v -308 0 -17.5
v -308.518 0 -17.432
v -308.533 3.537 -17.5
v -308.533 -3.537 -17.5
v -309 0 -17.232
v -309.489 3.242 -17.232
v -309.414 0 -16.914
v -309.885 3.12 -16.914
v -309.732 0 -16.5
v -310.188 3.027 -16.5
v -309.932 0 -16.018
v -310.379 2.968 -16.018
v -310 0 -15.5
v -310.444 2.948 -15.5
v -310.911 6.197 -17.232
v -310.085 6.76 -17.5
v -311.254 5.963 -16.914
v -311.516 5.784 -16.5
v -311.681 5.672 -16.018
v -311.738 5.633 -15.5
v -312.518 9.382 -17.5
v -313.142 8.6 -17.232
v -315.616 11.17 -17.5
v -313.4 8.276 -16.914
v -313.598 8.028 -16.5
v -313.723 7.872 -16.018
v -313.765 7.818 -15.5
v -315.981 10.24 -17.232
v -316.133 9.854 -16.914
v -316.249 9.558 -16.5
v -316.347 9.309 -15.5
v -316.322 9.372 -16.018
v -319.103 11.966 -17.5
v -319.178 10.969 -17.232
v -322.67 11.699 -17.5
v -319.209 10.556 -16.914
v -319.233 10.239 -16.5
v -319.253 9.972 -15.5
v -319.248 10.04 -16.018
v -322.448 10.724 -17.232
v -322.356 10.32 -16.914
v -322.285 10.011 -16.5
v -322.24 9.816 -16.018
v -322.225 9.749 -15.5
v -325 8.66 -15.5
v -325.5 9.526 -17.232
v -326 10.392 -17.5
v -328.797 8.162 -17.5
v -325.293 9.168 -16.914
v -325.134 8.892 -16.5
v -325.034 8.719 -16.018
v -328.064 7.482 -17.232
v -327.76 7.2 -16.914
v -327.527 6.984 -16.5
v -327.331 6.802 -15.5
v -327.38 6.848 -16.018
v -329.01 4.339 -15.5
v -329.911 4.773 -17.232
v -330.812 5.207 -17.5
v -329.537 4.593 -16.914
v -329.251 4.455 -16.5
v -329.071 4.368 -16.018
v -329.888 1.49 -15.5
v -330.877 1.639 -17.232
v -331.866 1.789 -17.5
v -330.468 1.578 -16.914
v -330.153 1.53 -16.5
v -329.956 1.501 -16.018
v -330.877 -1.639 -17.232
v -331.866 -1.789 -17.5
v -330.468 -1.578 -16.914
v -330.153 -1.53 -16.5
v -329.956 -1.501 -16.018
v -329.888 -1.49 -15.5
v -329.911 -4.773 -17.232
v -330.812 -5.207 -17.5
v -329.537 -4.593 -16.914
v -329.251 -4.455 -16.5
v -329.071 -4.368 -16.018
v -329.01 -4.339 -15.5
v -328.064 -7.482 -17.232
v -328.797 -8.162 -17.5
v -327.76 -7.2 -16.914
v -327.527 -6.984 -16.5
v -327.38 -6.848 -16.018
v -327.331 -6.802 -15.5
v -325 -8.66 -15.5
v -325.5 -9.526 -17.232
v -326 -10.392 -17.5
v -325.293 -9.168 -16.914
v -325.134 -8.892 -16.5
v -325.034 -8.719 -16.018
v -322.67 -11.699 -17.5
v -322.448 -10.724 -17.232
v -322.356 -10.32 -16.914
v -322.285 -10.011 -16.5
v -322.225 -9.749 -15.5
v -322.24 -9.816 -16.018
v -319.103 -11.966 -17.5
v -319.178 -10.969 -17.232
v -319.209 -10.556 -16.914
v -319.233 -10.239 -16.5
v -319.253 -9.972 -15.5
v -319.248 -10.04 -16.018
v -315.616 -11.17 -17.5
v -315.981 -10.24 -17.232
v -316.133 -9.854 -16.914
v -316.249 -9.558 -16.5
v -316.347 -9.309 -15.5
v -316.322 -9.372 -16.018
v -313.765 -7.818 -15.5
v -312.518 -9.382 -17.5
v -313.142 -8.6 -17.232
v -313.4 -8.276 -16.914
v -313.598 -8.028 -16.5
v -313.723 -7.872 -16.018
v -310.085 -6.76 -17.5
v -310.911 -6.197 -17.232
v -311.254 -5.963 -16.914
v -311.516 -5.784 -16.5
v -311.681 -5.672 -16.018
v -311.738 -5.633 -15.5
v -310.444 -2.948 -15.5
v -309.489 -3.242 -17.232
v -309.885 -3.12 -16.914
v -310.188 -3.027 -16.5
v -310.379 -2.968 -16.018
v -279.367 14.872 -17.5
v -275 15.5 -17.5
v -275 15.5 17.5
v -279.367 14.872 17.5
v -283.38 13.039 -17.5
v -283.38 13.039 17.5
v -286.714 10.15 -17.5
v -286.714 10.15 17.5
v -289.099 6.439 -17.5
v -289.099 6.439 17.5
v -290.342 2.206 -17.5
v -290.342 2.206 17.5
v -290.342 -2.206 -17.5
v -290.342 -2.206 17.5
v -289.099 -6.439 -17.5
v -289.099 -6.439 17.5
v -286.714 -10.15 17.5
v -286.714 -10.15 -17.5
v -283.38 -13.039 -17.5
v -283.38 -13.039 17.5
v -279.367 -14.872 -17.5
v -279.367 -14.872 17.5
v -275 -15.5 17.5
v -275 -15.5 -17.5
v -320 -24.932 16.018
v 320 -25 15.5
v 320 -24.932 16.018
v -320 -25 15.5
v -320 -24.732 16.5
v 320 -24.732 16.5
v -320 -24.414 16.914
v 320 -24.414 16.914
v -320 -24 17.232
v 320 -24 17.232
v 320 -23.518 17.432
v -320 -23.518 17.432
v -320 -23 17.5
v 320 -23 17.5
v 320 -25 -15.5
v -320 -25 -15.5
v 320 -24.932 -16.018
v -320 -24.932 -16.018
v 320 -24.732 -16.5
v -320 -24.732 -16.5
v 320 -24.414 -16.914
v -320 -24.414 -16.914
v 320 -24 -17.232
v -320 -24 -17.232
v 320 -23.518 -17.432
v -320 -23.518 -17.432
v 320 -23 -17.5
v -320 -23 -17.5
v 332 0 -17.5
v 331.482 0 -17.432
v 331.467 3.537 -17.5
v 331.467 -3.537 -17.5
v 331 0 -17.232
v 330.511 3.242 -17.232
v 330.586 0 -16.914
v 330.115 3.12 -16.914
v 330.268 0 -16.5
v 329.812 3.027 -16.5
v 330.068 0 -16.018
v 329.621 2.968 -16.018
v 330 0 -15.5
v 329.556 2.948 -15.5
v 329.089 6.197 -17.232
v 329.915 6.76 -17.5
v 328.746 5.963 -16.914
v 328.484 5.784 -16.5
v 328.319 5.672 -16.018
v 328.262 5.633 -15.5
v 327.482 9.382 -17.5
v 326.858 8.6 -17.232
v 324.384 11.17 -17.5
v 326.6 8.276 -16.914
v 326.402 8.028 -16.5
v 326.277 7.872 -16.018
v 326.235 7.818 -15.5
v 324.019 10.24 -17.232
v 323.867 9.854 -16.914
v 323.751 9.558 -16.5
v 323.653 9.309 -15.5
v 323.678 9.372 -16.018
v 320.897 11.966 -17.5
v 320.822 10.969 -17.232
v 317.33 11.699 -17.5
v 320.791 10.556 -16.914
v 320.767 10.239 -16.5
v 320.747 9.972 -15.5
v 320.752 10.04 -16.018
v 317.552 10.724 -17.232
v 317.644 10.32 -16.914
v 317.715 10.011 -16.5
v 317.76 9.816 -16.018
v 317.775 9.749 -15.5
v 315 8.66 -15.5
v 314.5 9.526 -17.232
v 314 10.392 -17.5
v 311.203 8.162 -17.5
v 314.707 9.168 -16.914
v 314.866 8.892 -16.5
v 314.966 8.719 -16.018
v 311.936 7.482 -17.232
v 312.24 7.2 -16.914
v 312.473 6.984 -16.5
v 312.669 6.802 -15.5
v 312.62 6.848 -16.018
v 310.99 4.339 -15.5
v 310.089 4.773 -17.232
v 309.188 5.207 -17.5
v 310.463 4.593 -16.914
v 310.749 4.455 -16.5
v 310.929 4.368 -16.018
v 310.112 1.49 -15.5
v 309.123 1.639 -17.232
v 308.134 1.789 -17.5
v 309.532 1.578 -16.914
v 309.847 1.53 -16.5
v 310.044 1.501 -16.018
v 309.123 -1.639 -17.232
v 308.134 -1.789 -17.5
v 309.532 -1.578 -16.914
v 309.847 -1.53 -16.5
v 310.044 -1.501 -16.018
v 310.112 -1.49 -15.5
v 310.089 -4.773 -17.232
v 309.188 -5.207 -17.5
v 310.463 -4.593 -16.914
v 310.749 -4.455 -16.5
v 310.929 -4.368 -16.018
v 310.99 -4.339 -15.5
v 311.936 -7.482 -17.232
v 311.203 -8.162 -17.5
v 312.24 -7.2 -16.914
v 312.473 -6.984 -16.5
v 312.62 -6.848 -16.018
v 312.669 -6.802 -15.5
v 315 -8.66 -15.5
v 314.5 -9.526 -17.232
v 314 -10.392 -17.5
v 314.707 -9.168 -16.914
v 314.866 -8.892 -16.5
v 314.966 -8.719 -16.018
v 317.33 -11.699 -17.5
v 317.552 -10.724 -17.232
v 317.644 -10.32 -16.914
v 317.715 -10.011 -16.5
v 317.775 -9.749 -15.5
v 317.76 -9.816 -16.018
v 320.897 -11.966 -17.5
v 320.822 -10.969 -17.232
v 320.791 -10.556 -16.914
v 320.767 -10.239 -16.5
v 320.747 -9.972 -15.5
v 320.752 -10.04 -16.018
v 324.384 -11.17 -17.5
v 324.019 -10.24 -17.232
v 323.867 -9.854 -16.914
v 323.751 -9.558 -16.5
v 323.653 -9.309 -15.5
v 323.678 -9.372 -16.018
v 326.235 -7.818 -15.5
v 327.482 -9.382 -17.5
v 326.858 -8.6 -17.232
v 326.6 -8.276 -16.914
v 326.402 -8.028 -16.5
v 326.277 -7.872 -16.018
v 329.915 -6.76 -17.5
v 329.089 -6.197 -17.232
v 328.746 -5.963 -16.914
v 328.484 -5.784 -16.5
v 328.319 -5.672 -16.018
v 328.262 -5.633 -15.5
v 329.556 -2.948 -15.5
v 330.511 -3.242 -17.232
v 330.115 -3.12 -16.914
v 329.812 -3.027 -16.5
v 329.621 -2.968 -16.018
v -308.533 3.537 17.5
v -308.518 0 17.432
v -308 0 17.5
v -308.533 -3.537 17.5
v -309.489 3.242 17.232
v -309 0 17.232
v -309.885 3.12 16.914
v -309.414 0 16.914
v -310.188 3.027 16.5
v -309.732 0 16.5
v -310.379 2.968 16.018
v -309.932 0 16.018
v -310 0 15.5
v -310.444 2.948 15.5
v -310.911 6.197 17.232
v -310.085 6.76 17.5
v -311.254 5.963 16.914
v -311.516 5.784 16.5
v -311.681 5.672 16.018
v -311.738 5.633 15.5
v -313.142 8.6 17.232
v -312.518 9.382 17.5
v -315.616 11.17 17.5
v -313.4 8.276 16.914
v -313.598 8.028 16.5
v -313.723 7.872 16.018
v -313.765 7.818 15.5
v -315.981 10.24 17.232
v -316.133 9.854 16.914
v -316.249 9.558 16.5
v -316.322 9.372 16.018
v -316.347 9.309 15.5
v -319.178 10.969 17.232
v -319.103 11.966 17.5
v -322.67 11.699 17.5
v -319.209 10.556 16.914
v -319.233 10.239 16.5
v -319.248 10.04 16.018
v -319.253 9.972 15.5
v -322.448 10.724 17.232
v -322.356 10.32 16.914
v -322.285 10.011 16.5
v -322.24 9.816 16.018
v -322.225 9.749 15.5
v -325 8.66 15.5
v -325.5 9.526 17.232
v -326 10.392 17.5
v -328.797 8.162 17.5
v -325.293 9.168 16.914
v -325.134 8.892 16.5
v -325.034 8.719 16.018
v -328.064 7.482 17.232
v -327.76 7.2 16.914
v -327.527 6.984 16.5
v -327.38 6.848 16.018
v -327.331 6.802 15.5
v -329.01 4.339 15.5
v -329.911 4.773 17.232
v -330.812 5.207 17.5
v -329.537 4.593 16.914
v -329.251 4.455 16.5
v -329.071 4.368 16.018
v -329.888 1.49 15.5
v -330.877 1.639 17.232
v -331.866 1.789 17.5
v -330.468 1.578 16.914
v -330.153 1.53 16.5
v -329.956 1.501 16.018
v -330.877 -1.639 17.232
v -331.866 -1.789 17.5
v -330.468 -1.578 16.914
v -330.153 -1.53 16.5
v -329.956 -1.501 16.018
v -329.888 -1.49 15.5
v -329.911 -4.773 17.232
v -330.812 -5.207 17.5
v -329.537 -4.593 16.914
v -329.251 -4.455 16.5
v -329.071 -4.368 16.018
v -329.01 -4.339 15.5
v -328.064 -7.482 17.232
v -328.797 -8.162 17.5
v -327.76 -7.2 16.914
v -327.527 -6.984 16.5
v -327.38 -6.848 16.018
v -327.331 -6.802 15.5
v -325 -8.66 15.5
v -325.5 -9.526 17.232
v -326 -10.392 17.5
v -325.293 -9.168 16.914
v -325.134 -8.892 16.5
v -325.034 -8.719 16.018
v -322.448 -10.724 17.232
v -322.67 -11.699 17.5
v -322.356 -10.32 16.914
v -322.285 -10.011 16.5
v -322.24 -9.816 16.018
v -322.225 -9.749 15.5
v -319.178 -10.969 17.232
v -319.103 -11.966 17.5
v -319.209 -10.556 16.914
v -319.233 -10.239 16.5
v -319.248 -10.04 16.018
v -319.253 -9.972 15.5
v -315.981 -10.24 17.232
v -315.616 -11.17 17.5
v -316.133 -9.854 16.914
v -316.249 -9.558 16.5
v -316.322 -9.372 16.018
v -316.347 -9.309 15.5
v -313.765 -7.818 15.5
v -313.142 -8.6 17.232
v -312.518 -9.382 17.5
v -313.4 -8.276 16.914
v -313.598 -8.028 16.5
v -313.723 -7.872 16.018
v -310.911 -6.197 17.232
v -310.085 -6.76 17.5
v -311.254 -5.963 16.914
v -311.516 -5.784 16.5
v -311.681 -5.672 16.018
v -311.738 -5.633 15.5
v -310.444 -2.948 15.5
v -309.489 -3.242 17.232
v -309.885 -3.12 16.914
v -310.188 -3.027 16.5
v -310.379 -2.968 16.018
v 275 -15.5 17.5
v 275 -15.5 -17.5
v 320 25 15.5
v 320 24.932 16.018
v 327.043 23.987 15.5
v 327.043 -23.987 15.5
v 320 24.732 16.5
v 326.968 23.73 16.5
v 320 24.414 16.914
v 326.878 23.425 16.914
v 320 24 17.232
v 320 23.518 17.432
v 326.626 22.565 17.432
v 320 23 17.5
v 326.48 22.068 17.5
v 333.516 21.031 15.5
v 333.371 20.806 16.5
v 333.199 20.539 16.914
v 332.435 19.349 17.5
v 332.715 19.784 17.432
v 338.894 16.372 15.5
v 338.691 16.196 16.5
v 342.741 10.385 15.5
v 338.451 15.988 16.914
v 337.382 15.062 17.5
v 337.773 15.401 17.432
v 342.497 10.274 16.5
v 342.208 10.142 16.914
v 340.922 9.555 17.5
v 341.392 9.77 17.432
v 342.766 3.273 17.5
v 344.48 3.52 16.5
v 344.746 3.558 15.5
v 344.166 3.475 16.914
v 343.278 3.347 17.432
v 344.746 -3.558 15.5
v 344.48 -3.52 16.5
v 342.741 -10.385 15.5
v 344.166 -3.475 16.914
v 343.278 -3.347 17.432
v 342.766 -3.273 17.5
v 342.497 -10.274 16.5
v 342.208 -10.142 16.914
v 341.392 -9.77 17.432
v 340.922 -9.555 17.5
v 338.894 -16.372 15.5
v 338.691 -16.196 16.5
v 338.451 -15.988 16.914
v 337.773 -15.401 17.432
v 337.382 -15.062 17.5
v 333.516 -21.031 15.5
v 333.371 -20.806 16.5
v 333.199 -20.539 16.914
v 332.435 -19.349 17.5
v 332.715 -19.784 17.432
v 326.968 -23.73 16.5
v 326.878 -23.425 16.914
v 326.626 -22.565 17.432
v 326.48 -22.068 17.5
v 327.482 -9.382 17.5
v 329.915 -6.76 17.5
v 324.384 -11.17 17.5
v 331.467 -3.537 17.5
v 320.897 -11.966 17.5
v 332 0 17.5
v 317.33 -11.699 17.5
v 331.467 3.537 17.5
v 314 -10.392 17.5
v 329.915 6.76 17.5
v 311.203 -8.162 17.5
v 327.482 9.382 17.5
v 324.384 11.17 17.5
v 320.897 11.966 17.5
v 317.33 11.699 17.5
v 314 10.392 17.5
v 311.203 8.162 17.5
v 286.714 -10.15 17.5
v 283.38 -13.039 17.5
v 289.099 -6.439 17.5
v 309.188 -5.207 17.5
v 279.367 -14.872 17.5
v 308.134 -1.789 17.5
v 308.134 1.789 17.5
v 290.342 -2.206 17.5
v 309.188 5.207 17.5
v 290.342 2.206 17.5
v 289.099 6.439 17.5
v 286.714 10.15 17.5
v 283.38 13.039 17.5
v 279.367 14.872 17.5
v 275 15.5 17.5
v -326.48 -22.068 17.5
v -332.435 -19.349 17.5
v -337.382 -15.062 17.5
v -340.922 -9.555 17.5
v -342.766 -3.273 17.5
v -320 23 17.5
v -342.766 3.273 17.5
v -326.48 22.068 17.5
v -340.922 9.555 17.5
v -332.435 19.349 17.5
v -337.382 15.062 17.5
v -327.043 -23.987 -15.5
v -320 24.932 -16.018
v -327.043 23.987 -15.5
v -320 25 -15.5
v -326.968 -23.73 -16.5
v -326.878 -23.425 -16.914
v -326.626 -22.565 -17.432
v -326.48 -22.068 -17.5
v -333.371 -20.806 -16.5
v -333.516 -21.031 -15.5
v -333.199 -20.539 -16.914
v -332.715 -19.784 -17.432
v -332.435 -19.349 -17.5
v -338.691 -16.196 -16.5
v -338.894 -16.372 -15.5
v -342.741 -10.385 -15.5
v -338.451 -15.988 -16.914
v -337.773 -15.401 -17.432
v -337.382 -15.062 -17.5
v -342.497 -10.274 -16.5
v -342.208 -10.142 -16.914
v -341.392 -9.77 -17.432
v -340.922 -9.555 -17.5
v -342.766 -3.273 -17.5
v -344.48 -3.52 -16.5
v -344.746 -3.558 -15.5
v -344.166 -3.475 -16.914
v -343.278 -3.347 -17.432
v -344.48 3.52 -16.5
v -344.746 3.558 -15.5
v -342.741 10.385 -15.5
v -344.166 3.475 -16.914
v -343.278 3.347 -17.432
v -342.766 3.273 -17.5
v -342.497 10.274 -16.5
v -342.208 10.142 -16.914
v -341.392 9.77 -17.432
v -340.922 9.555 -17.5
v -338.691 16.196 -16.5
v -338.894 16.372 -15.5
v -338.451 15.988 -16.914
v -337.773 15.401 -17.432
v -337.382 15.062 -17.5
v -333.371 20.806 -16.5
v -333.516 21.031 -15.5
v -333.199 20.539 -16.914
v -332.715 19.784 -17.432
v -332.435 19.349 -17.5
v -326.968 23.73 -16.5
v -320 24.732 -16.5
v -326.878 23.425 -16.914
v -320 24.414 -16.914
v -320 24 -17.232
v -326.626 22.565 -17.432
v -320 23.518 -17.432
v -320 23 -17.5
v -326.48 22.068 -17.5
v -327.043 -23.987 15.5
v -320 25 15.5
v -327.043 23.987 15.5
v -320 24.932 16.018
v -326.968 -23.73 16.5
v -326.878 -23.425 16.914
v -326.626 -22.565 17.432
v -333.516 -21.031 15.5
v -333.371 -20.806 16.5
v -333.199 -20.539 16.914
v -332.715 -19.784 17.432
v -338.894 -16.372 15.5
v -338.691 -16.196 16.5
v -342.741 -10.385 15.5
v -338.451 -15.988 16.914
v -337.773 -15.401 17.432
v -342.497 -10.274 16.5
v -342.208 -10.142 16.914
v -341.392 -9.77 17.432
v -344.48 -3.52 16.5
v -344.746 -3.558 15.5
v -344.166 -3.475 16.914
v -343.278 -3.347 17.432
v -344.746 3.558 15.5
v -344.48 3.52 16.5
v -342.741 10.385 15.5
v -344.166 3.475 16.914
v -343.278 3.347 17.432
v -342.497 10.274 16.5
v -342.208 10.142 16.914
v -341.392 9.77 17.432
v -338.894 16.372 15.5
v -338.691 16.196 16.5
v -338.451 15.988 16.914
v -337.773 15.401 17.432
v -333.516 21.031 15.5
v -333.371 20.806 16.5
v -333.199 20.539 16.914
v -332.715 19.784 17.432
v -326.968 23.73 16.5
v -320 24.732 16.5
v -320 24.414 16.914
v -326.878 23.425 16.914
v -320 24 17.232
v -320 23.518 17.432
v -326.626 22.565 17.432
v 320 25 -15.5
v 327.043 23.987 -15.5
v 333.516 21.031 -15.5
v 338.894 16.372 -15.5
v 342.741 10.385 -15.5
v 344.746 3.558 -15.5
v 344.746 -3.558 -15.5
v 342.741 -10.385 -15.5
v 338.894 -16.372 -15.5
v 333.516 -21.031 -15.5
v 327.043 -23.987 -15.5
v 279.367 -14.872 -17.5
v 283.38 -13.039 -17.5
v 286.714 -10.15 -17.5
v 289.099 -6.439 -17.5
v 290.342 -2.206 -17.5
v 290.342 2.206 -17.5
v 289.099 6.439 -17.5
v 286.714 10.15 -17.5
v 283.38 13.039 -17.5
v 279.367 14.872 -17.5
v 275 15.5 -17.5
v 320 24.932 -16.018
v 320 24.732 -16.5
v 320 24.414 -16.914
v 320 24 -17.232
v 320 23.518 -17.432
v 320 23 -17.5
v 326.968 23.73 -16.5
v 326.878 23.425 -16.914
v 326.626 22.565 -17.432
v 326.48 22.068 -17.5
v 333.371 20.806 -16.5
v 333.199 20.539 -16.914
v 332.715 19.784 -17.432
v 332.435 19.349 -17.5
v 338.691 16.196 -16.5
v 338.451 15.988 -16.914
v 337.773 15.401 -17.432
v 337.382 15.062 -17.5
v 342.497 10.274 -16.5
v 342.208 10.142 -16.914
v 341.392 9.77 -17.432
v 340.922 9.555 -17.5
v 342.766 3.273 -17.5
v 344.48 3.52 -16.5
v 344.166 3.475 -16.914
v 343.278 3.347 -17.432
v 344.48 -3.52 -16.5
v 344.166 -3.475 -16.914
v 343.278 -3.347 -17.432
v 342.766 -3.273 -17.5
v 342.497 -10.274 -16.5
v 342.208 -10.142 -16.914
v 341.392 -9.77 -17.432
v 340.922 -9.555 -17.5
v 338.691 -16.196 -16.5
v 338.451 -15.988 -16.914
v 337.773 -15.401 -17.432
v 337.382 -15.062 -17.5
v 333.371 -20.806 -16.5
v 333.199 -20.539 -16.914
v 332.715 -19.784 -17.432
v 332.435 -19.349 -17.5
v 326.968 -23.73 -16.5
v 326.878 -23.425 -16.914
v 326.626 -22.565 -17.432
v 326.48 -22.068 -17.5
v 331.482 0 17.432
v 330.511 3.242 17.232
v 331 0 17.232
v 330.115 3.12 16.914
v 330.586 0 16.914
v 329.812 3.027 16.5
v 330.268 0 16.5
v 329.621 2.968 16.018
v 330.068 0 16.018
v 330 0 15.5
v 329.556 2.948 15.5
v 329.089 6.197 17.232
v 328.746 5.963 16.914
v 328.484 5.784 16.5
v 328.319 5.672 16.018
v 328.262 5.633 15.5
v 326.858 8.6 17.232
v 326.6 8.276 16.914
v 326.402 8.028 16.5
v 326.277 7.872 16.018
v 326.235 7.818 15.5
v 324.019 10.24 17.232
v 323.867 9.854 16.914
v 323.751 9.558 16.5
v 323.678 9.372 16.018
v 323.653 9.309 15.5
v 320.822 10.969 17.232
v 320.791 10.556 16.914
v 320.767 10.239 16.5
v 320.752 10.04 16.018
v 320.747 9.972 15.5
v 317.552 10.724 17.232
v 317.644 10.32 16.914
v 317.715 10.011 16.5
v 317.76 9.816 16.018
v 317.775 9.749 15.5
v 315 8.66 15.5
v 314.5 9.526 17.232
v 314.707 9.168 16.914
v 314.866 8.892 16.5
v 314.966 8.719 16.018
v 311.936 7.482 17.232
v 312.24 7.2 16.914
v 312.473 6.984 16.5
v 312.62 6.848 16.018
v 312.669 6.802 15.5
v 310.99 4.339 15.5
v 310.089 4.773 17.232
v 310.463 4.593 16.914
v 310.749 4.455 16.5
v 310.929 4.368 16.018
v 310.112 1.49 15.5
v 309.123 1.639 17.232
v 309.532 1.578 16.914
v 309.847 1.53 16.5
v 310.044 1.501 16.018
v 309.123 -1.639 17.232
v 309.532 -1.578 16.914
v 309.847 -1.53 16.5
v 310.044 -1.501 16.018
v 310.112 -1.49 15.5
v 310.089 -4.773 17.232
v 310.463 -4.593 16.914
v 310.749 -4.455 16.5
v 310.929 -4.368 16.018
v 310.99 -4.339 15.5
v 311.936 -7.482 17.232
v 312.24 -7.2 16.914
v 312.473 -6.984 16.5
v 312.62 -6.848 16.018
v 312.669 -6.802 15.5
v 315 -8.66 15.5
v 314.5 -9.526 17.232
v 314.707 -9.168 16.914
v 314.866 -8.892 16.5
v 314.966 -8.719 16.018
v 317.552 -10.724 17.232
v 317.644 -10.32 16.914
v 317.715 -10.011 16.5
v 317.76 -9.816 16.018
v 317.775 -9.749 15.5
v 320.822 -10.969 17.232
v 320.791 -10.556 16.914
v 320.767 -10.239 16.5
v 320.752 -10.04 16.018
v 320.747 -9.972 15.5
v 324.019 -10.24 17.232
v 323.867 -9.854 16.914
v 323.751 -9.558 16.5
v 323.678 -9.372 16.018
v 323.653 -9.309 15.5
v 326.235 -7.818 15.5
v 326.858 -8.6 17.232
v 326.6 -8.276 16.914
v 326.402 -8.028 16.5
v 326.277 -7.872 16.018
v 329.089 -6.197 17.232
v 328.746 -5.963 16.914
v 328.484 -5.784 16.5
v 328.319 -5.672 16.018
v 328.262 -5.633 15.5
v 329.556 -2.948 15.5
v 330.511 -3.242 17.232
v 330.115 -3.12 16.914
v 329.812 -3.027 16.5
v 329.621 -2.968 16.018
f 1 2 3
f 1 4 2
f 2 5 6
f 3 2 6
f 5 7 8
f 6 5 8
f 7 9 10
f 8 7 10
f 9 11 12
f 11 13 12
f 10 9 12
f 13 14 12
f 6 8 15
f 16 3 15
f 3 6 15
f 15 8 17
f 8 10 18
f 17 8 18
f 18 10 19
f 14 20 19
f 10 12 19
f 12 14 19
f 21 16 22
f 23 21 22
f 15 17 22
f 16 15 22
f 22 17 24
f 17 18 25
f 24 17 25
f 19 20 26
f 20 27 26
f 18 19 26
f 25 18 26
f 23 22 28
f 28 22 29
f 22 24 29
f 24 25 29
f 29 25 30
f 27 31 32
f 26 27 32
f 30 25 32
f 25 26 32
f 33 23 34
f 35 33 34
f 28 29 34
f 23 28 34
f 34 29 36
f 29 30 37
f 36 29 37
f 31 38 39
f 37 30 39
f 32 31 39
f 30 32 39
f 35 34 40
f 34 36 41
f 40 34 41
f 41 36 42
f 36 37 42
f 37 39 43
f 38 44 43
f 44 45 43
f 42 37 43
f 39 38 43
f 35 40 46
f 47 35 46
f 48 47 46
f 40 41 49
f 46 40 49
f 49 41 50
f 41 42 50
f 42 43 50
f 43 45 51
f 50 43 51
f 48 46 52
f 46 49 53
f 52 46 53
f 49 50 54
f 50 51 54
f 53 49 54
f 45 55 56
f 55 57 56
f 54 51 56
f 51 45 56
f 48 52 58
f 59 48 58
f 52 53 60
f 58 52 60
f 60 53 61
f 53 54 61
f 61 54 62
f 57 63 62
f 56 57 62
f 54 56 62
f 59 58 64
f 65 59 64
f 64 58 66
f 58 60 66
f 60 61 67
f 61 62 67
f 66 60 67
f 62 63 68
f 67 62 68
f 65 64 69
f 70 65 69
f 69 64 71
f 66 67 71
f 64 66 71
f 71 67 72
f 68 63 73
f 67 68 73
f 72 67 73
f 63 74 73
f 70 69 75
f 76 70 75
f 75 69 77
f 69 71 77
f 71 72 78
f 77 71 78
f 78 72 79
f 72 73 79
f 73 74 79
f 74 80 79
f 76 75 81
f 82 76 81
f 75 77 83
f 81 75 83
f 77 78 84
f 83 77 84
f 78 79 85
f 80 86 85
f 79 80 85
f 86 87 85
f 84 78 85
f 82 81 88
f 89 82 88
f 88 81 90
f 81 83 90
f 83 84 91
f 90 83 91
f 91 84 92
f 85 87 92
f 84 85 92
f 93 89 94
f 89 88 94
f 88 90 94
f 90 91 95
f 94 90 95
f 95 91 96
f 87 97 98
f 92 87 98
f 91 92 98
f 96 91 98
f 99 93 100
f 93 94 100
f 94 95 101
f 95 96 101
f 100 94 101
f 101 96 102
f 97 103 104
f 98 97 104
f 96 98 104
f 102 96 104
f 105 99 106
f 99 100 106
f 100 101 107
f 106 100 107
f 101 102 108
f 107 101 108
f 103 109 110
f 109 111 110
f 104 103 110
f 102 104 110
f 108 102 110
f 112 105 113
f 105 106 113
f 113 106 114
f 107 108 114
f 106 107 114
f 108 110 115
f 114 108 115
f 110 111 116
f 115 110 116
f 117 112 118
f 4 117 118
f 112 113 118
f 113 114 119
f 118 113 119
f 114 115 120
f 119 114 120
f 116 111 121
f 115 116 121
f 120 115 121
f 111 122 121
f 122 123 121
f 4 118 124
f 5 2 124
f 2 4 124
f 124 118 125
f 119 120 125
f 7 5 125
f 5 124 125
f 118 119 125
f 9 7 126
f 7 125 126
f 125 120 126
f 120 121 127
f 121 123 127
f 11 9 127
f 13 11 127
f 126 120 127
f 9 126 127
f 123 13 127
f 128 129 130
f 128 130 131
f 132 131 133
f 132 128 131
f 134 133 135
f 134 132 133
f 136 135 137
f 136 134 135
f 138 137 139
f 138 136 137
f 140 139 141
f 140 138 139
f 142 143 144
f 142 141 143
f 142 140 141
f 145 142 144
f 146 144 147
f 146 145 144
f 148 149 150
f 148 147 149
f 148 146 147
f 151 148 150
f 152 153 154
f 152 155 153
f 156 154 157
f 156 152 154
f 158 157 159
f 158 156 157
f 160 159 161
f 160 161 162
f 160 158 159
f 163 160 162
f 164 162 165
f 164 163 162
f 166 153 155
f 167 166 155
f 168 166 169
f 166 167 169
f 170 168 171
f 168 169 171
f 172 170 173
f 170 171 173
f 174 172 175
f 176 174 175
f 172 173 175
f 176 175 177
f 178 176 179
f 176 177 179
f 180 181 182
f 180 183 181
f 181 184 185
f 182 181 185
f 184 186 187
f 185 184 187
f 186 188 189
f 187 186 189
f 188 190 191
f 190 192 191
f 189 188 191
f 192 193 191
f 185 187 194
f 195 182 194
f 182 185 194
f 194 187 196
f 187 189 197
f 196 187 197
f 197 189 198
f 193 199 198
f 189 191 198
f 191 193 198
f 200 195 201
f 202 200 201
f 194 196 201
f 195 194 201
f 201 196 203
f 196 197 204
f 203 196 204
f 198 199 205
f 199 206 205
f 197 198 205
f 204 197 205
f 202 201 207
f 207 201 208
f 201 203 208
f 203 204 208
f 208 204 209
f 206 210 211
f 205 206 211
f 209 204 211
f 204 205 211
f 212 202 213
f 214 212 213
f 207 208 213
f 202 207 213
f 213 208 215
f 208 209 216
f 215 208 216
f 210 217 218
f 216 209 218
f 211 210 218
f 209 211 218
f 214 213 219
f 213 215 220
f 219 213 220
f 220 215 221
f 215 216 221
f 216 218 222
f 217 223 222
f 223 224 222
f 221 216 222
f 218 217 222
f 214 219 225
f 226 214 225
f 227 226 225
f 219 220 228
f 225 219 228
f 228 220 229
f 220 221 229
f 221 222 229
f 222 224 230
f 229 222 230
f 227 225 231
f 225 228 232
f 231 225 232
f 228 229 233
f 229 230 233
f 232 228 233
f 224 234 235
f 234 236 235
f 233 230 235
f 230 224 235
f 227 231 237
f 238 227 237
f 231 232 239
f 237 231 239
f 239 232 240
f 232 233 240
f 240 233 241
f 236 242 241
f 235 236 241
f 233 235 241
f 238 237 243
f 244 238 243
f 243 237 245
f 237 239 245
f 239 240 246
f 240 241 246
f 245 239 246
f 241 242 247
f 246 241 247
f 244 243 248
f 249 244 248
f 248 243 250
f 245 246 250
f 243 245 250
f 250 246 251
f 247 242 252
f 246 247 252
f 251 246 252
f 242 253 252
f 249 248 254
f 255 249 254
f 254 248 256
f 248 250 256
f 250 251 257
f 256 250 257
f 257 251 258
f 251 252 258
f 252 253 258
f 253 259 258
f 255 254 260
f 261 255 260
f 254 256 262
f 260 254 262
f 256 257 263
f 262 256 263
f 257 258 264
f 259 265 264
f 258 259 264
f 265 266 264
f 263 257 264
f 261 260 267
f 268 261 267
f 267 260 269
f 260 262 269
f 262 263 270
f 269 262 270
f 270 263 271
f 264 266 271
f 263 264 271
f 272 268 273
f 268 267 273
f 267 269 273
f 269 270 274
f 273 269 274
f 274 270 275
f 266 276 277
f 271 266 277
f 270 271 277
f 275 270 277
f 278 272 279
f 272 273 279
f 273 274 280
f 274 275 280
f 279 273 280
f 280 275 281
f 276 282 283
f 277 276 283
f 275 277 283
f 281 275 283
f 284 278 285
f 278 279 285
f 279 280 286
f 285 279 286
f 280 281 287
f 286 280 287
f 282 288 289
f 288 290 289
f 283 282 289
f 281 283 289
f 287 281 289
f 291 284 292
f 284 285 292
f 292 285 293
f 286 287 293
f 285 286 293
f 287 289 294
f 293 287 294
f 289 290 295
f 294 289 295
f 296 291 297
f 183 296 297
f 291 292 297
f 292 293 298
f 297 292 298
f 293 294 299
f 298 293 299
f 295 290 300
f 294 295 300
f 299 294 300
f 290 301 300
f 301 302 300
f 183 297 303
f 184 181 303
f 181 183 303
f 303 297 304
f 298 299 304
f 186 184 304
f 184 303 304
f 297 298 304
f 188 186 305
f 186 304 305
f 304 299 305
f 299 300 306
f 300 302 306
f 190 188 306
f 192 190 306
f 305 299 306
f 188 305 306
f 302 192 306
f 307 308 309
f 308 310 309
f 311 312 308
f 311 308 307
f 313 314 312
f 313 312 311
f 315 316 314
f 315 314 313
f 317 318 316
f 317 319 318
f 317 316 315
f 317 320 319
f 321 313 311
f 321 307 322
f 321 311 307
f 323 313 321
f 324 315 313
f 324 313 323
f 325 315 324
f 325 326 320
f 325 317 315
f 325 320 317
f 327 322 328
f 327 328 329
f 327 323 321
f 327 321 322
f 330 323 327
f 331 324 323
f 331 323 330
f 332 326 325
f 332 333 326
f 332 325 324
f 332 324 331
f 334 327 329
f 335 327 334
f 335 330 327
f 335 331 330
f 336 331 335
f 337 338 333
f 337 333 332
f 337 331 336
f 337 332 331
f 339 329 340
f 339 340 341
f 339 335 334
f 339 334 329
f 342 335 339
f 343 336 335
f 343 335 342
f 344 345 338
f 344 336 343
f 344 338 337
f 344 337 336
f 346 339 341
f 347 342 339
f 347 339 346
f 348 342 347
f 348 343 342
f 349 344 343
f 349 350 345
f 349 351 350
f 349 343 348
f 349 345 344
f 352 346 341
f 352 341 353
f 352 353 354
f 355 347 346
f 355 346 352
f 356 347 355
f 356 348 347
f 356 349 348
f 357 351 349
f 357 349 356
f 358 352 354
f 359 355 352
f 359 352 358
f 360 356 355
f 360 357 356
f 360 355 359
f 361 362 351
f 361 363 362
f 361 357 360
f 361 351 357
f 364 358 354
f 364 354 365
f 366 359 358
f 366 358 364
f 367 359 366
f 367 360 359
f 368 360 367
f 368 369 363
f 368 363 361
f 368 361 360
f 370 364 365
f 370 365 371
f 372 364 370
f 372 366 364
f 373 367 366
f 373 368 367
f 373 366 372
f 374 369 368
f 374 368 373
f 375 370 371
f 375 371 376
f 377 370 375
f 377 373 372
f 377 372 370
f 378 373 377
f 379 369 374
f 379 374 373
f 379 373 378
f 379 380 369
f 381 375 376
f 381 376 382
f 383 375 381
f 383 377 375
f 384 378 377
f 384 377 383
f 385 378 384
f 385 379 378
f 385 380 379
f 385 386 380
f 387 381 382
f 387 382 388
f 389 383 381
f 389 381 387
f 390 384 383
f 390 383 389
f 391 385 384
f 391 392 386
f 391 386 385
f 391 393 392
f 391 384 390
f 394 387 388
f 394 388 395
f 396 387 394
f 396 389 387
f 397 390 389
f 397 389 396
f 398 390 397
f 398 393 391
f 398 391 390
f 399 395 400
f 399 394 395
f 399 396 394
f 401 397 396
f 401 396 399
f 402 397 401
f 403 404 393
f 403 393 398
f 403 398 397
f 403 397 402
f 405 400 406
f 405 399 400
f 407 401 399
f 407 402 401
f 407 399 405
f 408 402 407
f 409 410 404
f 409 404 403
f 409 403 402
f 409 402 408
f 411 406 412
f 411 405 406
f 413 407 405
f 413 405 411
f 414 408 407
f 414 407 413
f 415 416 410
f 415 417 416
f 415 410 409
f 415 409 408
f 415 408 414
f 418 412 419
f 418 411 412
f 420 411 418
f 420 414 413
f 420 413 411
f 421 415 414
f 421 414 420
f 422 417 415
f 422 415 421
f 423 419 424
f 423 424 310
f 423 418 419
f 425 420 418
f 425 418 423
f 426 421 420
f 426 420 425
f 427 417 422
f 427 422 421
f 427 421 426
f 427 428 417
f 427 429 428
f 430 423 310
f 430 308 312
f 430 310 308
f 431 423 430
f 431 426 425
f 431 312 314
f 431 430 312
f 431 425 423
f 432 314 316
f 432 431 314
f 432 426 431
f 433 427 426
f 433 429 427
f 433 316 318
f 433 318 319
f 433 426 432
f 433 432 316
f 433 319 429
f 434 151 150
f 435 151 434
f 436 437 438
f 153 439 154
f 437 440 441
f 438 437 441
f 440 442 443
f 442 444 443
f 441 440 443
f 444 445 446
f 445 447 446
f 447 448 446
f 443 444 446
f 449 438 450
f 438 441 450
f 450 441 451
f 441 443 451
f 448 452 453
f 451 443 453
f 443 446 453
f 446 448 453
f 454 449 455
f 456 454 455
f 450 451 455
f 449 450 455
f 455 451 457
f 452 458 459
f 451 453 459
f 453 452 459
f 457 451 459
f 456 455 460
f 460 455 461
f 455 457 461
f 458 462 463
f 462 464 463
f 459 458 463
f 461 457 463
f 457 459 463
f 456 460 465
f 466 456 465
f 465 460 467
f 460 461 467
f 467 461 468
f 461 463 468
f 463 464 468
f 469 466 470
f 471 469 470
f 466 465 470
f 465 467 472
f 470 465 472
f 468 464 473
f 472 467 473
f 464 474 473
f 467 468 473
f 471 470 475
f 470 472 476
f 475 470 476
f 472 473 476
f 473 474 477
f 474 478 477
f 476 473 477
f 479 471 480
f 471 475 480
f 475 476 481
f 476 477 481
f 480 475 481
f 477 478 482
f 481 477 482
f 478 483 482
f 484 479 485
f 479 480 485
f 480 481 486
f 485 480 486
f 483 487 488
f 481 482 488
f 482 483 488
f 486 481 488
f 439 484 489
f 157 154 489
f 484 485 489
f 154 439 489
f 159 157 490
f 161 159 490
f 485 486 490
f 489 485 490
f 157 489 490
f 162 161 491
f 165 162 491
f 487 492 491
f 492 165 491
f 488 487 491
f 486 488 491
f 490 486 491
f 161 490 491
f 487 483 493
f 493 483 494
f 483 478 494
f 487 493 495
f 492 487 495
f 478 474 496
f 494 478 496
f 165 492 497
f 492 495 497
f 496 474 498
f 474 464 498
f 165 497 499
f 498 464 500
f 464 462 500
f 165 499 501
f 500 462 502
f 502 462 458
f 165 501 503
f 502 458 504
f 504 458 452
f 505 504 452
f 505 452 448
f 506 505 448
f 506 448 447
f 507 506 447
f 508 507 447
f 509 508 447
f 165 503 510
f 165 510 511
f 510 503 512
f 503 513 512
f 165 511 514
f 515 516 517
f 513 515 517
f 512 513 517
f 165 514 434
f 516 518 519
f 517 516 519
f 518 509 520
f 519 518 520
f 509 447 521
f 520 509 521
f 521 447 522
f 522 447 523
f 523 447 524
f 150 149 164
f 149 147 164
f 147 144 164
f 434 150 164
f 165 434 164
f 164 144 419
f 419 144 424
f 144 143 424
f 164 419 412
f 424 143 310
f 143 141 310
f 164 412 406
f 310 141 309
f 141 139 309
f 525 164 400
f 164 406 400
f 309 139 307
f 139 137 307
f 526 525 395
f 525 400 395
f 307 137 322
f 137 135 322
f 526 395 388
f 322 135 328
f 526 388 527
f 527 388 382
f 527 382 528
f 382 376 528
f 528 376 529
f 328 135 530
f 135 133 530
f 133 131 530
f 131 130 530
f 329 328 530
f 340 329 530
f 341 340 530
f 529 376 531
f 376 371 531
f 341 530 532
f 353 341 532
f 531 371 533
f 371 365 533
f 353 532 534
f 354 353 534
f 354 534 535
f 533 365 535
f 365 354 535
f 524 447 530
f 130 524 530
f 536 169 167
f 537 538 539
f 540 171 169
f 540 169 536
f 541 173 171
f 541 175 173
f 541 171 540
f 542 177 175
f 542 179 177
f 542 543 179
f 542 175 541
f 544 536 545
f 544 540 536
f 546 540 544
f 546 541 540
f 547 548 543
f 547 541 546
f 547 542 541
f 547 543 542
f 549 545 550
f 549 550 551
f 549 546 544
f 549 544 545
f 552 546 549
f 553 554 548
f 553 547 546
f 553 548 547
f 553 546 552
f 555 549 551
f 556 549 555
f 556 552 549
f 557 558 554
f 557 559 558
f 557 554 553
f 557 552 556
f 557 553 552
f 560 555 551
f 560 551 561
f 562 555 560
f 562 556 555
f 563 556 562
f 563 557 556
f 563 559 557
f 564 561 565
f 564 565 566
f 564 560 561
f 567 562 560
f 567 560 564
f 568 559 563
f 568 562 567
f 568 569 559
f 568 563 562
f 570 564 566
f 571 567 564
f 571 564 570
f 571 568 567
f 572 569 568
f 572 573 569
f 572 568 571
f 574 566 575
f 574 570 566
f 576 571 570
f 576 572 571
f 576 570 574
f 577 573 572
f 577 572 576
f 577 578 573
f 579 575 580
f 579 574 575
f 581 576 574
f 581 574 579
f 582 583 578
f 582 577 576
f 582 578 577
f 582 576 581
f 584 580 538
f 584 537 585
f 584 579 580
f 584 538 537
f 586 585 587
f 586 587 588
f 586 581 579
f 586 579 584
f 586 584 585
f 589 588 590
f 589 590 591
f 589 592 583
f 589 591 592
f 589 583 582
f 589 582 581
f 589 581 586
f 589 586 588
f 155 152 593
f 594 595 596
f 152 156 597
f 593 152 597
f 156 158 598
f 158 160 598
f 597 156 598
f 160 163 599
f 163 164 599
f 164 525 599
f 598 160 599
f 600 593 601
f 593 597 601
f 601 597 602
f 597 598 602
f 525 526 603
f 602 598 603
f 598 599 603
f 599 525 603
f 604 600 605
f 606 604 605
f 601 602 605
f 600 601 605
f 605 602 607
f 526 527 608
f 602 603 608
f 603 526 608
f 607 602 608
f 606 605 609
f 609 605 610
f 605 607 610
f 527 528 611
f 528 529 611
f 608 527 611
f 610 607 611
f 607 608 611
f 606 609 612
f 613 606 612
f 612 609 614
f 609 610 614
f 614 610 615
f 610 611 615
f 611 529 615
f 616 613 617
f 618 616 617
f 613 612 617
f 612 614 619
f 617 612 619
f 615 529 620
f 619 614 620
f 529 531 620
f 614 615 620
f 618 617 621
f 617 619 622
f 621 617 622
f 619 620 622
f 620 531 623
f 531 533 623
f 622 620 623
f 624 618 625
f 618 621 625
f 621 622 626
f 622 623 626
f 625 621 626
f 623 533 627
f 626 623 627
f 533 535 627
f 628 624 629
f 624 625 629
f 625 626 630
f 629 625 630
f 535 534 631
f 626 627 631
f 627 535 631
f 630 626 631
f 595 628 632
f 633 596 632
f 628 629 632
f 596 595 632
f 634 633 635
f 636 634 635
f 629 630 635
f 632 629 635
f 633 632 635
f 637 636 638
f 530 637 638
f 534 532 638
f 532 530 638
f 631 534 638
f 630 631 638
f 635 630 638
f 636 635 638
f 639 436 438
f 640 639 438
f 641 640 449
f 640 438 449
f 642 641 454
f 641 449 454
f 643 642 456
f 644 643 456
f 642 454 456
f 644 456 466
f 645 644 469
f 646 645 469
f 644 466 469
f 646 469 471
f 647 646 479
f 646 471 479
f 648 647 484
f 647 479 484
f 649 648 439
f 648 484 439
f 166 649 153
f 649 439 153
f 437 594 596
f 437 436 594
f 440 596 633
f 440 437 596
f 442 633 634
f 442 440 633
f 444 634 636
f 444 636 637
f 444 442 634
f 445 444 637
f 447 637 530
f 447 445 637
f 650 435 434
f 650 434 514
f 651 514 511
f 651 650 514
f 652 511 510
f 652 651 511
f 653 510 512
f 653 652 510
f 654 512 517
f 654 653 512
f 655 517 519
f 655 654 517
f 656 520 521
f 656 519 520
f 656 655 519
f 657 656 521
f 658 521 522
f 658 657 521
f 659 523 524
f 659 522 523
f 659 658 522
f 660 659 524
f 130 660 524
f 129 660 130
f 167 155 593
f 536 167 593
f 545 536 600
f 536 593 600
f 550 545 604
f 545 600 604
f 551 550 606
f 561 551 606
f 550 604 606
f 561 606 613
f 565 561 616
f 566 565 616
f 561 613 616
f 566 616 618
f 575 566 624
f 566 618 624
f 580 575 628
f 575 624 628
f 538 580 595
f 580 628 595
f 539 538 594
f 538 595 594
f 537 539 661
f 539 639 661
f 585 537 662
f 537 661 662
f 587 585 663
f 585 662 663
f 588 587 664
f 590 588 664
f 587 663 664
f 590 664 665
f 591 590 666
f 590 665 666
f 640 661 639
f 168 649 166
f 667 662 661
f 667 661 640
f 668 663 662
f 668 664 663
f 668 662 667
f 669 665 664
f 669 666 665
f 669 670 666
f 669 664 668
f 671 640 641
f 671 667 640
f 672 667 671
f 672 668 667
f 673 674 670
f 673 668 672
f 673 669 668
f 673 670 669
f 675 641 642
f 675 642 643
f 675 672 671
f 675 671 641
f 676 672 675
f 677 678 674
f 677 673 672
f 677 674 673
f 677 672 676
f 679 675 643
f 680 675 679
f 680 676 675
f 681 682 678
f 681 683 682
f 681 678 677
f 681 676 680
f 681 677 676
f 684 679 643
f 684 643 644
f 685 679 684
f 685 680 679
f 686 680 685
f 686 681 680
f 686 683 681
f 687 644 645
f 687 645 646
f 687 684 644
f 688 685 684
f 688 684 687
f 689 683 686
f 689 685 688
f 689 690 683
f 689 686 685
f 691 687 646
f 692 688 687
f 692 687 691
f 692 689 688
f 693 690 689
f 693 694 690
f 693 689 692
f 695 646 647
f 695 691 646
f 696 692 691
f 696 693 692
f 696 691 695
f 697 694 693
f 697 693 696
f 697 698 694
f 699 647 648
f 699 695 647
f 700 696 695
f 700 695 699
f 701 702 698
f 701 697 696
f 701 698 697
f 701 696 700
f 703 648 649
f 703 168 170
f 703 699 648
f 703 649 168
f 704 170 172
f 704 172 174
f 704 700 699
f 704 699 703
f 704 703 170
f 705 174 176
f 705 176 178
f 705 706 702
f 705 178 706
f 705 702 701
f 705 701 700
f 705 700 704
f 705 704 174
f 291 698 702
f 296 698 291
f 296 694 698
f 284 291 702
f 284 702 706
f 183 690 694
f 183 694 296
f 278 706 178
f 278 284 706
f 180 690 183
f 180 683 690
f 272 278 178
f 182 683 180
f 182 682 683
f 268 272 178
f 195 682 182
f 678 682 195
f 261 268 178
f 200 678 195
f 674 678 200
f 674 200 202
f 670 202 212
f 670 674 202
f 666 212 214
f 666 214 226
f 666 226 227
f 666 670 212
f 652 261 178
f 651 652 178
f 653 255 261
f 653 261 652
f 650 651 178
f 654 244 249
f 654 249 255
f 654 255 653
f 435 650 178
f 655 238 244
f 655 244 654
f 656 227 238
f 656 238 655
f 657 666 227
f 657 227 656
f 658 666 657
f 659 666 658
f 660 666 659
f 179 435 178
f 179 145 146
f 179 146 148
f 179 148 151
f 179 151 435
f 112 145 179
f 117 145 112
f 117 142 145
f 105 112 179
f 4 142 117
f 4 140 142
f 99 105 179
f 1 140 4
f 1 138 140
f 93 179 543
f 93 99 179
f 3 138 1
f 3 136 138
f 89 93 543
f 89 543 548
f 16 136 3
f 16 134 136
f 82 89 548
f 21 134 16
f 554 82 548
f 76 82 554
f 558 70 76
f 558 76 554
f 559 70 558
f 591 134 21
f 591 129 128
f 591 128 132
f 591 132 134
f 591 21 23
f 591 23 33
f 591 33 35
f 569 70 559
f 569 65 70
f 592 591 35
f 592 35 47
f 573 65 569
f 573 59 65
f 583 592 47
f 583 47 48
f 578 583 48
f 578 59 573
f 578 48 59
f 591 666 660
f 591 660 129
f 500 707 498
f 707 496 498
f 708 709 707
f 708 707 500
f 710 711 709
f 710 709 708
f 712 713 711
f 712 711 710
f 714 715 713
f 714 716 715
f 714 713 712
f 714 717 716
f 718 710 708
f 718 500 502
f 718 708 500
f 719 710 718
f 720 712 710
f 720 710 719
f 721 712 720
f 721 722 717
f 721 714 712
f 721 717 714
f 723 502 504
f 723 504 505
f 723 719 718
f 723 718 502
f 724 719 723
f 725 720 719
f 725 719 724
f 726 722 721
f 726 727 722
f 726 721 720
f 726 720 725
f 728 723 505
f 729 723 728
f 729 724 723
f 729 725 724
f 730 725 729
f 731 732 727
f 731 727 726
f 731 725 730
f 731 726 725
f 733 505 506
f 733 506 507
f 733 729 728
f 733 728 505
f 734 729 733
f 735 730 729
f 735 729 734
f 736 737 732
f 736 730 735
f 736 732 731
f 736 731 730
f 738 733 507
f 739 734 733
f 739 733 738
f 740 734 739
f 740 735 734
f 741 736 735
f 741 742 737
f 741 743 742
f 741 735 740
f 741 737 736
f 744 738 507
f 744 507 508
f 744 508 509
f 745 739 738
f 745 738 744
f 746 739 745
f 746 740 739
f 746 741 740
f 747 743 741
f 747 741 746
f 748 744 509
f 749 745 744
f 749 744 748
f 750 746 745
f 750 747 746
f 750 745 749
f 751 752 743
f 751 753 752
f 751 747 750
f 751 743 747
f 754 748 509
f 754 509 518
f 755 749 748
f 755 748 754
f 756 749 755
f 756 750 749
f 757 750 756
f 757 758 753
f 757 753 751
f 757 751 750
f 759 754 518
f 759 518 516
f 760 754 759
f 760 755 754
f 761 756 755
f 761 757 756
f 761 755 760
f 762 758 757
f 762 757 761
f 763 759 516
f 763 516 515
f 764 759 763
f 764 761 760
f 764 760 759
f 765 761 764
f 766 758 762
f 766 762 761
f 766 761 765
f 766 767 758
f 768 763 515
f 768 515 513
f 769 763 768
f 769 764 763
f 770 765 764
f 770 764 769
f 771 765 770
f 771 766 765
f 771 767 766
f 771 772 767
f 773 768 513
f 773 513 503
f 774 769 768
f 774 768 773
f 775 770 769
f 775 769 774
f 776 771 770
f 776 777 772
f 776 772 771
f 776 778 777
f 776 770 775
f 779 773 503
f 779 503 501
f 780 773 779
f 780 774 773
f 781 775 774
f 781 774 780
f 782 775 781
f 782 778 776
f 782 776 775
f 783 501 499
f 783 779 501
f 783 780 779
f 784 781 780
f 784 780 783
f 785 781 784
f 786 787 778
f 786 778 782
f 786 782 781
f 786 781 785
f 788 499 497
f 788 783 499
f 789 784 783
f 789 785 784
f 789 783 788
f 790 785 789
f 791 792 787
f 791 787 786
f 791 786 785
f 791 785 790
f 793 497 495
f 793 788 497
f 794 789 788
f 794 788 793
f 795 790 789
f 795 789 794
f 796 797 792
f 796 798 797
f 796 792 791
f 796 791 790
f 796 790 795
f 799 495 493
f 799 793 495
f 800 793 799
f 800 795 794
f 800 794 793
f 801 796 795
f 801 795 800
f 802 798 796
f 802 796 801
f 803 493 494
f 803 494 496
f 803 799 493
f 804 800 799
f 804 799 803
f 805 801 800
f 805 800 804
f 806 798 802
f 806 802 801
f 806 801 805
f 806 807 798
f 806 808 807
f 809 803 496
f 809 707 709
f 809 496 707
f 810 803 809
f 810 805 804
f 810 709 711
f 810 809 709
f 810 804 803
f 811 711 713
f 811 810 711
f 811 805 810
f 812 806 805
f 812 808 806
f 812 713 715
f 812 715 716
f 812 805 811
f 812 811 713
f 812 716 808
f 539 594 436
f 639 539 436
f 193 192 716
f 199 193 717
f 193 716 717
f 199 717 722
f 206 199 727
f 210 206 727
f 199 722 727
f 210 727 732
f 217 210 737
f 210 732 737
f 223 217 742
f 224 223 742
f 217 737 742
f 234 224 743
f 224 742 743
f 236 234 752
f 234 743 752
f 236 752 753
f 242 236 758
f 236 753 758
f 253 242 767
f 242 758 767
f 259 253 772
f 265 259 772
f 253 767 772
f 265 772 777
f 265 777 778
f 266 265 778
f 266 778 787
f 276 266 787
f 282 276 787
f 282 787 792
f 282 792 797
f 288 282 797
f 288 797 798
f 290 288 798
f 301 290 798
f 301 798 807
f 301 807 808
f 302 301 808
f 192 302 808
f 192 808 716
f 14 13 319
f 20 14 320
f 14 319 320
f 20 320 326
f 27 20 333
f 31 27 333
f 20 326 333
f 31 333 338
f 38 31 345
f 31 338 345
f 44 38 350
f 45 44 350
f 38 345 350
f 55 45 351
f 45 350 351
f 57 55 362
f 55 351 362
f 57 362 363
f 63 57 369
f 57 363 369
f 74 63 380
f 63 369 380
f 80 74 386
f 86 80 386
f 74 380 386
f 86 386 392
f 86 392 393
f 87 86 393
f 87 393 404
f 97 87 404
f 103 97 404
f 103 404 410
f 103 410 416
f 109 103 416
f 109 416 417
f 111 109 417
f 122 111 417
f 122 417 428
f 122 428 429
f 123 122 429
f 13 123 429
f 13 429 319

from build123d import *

# Parameters (mm, degrees)
BOSS_EXTRUDE2_DEPTH = 17.5
SKETCH5_R           = 10
CUT_EXTRUDE1_DEPTH  = 36
CUT_EXTRUDE2_DEPTH  = 40
FILLET1_R           = 2


with BuildPart() as part:
    # Sketch4 → Boss-Extrude2 (new body, symmetric)
    with BuildSketch(Plane.XY):
        with BuildLine():
            Line((-320, 25), (320, 25))
            ThreePointArc((320, 25), (345, 0), (320, -25))
            Line((320, -25), (-320, -25))
            ThreePointArc((-320, -25), (-345, 0), (-320, 25))
        make_face()
    extrude(amount=BOSS_EXTRUDE2_DEPTH, both=True)

    # Sketch5 → Cut-Extrude1 (cut, through all)
    with BuildSketch(Plane.XY.offset(17.5)):
        with Locations((320, 0)):
            Circle(SKETCH5_R)
        with Locations((-320, 0)):
            Circle(SKETCH5_R)
    extrude(amount=-CUT_EXTRUDE1_DEPTH, mode=Mode.SUBTRACT)

    # Sketch6 → Cut-Extrude2 (cut)
    with BuildSketch(Plane(origin=(0, 0, -17.5), x_dir=(-1, 0, 0), z_dir=(0, 0, -1))):
        with BuildLine():
            Line((-275, 15.5), (275, 15.5))
            ThreePointArc((275, 15.5), (290.5, 0), (275, -15.5))
            Line((275, -15.5), (-275, -15.5))
            ThreePointArc((-275, -15.5), (-290.5, 0), (-275, 15.5))
        make_face()
    extrude(amount=-CUT_EXTRUDE2_DEPTH, mode=Mode.SUBTRACT)

    # Fillet1
    fillet1_edges = [part.edges().sort_by_distance(p)[0] for p in [
        (345, 0, 17.5),
        (310, 0, -17.5),
        (310, 0, 17.5),
        (0, 25, 17.5),
        (-330, 0, -17.5),
        (-330, 0, 17.5),
        (-345, 0, 17.5),
        (0, 25, -17.5),
        (345, 0, -17.5),
        (0, -25, -17.5),
        (-345, 0, -17.5),
        (0, -25, 17.5),
    ]]
    fillet(fillet1_edges, radius=FILLET1_R)


solid = part.part
